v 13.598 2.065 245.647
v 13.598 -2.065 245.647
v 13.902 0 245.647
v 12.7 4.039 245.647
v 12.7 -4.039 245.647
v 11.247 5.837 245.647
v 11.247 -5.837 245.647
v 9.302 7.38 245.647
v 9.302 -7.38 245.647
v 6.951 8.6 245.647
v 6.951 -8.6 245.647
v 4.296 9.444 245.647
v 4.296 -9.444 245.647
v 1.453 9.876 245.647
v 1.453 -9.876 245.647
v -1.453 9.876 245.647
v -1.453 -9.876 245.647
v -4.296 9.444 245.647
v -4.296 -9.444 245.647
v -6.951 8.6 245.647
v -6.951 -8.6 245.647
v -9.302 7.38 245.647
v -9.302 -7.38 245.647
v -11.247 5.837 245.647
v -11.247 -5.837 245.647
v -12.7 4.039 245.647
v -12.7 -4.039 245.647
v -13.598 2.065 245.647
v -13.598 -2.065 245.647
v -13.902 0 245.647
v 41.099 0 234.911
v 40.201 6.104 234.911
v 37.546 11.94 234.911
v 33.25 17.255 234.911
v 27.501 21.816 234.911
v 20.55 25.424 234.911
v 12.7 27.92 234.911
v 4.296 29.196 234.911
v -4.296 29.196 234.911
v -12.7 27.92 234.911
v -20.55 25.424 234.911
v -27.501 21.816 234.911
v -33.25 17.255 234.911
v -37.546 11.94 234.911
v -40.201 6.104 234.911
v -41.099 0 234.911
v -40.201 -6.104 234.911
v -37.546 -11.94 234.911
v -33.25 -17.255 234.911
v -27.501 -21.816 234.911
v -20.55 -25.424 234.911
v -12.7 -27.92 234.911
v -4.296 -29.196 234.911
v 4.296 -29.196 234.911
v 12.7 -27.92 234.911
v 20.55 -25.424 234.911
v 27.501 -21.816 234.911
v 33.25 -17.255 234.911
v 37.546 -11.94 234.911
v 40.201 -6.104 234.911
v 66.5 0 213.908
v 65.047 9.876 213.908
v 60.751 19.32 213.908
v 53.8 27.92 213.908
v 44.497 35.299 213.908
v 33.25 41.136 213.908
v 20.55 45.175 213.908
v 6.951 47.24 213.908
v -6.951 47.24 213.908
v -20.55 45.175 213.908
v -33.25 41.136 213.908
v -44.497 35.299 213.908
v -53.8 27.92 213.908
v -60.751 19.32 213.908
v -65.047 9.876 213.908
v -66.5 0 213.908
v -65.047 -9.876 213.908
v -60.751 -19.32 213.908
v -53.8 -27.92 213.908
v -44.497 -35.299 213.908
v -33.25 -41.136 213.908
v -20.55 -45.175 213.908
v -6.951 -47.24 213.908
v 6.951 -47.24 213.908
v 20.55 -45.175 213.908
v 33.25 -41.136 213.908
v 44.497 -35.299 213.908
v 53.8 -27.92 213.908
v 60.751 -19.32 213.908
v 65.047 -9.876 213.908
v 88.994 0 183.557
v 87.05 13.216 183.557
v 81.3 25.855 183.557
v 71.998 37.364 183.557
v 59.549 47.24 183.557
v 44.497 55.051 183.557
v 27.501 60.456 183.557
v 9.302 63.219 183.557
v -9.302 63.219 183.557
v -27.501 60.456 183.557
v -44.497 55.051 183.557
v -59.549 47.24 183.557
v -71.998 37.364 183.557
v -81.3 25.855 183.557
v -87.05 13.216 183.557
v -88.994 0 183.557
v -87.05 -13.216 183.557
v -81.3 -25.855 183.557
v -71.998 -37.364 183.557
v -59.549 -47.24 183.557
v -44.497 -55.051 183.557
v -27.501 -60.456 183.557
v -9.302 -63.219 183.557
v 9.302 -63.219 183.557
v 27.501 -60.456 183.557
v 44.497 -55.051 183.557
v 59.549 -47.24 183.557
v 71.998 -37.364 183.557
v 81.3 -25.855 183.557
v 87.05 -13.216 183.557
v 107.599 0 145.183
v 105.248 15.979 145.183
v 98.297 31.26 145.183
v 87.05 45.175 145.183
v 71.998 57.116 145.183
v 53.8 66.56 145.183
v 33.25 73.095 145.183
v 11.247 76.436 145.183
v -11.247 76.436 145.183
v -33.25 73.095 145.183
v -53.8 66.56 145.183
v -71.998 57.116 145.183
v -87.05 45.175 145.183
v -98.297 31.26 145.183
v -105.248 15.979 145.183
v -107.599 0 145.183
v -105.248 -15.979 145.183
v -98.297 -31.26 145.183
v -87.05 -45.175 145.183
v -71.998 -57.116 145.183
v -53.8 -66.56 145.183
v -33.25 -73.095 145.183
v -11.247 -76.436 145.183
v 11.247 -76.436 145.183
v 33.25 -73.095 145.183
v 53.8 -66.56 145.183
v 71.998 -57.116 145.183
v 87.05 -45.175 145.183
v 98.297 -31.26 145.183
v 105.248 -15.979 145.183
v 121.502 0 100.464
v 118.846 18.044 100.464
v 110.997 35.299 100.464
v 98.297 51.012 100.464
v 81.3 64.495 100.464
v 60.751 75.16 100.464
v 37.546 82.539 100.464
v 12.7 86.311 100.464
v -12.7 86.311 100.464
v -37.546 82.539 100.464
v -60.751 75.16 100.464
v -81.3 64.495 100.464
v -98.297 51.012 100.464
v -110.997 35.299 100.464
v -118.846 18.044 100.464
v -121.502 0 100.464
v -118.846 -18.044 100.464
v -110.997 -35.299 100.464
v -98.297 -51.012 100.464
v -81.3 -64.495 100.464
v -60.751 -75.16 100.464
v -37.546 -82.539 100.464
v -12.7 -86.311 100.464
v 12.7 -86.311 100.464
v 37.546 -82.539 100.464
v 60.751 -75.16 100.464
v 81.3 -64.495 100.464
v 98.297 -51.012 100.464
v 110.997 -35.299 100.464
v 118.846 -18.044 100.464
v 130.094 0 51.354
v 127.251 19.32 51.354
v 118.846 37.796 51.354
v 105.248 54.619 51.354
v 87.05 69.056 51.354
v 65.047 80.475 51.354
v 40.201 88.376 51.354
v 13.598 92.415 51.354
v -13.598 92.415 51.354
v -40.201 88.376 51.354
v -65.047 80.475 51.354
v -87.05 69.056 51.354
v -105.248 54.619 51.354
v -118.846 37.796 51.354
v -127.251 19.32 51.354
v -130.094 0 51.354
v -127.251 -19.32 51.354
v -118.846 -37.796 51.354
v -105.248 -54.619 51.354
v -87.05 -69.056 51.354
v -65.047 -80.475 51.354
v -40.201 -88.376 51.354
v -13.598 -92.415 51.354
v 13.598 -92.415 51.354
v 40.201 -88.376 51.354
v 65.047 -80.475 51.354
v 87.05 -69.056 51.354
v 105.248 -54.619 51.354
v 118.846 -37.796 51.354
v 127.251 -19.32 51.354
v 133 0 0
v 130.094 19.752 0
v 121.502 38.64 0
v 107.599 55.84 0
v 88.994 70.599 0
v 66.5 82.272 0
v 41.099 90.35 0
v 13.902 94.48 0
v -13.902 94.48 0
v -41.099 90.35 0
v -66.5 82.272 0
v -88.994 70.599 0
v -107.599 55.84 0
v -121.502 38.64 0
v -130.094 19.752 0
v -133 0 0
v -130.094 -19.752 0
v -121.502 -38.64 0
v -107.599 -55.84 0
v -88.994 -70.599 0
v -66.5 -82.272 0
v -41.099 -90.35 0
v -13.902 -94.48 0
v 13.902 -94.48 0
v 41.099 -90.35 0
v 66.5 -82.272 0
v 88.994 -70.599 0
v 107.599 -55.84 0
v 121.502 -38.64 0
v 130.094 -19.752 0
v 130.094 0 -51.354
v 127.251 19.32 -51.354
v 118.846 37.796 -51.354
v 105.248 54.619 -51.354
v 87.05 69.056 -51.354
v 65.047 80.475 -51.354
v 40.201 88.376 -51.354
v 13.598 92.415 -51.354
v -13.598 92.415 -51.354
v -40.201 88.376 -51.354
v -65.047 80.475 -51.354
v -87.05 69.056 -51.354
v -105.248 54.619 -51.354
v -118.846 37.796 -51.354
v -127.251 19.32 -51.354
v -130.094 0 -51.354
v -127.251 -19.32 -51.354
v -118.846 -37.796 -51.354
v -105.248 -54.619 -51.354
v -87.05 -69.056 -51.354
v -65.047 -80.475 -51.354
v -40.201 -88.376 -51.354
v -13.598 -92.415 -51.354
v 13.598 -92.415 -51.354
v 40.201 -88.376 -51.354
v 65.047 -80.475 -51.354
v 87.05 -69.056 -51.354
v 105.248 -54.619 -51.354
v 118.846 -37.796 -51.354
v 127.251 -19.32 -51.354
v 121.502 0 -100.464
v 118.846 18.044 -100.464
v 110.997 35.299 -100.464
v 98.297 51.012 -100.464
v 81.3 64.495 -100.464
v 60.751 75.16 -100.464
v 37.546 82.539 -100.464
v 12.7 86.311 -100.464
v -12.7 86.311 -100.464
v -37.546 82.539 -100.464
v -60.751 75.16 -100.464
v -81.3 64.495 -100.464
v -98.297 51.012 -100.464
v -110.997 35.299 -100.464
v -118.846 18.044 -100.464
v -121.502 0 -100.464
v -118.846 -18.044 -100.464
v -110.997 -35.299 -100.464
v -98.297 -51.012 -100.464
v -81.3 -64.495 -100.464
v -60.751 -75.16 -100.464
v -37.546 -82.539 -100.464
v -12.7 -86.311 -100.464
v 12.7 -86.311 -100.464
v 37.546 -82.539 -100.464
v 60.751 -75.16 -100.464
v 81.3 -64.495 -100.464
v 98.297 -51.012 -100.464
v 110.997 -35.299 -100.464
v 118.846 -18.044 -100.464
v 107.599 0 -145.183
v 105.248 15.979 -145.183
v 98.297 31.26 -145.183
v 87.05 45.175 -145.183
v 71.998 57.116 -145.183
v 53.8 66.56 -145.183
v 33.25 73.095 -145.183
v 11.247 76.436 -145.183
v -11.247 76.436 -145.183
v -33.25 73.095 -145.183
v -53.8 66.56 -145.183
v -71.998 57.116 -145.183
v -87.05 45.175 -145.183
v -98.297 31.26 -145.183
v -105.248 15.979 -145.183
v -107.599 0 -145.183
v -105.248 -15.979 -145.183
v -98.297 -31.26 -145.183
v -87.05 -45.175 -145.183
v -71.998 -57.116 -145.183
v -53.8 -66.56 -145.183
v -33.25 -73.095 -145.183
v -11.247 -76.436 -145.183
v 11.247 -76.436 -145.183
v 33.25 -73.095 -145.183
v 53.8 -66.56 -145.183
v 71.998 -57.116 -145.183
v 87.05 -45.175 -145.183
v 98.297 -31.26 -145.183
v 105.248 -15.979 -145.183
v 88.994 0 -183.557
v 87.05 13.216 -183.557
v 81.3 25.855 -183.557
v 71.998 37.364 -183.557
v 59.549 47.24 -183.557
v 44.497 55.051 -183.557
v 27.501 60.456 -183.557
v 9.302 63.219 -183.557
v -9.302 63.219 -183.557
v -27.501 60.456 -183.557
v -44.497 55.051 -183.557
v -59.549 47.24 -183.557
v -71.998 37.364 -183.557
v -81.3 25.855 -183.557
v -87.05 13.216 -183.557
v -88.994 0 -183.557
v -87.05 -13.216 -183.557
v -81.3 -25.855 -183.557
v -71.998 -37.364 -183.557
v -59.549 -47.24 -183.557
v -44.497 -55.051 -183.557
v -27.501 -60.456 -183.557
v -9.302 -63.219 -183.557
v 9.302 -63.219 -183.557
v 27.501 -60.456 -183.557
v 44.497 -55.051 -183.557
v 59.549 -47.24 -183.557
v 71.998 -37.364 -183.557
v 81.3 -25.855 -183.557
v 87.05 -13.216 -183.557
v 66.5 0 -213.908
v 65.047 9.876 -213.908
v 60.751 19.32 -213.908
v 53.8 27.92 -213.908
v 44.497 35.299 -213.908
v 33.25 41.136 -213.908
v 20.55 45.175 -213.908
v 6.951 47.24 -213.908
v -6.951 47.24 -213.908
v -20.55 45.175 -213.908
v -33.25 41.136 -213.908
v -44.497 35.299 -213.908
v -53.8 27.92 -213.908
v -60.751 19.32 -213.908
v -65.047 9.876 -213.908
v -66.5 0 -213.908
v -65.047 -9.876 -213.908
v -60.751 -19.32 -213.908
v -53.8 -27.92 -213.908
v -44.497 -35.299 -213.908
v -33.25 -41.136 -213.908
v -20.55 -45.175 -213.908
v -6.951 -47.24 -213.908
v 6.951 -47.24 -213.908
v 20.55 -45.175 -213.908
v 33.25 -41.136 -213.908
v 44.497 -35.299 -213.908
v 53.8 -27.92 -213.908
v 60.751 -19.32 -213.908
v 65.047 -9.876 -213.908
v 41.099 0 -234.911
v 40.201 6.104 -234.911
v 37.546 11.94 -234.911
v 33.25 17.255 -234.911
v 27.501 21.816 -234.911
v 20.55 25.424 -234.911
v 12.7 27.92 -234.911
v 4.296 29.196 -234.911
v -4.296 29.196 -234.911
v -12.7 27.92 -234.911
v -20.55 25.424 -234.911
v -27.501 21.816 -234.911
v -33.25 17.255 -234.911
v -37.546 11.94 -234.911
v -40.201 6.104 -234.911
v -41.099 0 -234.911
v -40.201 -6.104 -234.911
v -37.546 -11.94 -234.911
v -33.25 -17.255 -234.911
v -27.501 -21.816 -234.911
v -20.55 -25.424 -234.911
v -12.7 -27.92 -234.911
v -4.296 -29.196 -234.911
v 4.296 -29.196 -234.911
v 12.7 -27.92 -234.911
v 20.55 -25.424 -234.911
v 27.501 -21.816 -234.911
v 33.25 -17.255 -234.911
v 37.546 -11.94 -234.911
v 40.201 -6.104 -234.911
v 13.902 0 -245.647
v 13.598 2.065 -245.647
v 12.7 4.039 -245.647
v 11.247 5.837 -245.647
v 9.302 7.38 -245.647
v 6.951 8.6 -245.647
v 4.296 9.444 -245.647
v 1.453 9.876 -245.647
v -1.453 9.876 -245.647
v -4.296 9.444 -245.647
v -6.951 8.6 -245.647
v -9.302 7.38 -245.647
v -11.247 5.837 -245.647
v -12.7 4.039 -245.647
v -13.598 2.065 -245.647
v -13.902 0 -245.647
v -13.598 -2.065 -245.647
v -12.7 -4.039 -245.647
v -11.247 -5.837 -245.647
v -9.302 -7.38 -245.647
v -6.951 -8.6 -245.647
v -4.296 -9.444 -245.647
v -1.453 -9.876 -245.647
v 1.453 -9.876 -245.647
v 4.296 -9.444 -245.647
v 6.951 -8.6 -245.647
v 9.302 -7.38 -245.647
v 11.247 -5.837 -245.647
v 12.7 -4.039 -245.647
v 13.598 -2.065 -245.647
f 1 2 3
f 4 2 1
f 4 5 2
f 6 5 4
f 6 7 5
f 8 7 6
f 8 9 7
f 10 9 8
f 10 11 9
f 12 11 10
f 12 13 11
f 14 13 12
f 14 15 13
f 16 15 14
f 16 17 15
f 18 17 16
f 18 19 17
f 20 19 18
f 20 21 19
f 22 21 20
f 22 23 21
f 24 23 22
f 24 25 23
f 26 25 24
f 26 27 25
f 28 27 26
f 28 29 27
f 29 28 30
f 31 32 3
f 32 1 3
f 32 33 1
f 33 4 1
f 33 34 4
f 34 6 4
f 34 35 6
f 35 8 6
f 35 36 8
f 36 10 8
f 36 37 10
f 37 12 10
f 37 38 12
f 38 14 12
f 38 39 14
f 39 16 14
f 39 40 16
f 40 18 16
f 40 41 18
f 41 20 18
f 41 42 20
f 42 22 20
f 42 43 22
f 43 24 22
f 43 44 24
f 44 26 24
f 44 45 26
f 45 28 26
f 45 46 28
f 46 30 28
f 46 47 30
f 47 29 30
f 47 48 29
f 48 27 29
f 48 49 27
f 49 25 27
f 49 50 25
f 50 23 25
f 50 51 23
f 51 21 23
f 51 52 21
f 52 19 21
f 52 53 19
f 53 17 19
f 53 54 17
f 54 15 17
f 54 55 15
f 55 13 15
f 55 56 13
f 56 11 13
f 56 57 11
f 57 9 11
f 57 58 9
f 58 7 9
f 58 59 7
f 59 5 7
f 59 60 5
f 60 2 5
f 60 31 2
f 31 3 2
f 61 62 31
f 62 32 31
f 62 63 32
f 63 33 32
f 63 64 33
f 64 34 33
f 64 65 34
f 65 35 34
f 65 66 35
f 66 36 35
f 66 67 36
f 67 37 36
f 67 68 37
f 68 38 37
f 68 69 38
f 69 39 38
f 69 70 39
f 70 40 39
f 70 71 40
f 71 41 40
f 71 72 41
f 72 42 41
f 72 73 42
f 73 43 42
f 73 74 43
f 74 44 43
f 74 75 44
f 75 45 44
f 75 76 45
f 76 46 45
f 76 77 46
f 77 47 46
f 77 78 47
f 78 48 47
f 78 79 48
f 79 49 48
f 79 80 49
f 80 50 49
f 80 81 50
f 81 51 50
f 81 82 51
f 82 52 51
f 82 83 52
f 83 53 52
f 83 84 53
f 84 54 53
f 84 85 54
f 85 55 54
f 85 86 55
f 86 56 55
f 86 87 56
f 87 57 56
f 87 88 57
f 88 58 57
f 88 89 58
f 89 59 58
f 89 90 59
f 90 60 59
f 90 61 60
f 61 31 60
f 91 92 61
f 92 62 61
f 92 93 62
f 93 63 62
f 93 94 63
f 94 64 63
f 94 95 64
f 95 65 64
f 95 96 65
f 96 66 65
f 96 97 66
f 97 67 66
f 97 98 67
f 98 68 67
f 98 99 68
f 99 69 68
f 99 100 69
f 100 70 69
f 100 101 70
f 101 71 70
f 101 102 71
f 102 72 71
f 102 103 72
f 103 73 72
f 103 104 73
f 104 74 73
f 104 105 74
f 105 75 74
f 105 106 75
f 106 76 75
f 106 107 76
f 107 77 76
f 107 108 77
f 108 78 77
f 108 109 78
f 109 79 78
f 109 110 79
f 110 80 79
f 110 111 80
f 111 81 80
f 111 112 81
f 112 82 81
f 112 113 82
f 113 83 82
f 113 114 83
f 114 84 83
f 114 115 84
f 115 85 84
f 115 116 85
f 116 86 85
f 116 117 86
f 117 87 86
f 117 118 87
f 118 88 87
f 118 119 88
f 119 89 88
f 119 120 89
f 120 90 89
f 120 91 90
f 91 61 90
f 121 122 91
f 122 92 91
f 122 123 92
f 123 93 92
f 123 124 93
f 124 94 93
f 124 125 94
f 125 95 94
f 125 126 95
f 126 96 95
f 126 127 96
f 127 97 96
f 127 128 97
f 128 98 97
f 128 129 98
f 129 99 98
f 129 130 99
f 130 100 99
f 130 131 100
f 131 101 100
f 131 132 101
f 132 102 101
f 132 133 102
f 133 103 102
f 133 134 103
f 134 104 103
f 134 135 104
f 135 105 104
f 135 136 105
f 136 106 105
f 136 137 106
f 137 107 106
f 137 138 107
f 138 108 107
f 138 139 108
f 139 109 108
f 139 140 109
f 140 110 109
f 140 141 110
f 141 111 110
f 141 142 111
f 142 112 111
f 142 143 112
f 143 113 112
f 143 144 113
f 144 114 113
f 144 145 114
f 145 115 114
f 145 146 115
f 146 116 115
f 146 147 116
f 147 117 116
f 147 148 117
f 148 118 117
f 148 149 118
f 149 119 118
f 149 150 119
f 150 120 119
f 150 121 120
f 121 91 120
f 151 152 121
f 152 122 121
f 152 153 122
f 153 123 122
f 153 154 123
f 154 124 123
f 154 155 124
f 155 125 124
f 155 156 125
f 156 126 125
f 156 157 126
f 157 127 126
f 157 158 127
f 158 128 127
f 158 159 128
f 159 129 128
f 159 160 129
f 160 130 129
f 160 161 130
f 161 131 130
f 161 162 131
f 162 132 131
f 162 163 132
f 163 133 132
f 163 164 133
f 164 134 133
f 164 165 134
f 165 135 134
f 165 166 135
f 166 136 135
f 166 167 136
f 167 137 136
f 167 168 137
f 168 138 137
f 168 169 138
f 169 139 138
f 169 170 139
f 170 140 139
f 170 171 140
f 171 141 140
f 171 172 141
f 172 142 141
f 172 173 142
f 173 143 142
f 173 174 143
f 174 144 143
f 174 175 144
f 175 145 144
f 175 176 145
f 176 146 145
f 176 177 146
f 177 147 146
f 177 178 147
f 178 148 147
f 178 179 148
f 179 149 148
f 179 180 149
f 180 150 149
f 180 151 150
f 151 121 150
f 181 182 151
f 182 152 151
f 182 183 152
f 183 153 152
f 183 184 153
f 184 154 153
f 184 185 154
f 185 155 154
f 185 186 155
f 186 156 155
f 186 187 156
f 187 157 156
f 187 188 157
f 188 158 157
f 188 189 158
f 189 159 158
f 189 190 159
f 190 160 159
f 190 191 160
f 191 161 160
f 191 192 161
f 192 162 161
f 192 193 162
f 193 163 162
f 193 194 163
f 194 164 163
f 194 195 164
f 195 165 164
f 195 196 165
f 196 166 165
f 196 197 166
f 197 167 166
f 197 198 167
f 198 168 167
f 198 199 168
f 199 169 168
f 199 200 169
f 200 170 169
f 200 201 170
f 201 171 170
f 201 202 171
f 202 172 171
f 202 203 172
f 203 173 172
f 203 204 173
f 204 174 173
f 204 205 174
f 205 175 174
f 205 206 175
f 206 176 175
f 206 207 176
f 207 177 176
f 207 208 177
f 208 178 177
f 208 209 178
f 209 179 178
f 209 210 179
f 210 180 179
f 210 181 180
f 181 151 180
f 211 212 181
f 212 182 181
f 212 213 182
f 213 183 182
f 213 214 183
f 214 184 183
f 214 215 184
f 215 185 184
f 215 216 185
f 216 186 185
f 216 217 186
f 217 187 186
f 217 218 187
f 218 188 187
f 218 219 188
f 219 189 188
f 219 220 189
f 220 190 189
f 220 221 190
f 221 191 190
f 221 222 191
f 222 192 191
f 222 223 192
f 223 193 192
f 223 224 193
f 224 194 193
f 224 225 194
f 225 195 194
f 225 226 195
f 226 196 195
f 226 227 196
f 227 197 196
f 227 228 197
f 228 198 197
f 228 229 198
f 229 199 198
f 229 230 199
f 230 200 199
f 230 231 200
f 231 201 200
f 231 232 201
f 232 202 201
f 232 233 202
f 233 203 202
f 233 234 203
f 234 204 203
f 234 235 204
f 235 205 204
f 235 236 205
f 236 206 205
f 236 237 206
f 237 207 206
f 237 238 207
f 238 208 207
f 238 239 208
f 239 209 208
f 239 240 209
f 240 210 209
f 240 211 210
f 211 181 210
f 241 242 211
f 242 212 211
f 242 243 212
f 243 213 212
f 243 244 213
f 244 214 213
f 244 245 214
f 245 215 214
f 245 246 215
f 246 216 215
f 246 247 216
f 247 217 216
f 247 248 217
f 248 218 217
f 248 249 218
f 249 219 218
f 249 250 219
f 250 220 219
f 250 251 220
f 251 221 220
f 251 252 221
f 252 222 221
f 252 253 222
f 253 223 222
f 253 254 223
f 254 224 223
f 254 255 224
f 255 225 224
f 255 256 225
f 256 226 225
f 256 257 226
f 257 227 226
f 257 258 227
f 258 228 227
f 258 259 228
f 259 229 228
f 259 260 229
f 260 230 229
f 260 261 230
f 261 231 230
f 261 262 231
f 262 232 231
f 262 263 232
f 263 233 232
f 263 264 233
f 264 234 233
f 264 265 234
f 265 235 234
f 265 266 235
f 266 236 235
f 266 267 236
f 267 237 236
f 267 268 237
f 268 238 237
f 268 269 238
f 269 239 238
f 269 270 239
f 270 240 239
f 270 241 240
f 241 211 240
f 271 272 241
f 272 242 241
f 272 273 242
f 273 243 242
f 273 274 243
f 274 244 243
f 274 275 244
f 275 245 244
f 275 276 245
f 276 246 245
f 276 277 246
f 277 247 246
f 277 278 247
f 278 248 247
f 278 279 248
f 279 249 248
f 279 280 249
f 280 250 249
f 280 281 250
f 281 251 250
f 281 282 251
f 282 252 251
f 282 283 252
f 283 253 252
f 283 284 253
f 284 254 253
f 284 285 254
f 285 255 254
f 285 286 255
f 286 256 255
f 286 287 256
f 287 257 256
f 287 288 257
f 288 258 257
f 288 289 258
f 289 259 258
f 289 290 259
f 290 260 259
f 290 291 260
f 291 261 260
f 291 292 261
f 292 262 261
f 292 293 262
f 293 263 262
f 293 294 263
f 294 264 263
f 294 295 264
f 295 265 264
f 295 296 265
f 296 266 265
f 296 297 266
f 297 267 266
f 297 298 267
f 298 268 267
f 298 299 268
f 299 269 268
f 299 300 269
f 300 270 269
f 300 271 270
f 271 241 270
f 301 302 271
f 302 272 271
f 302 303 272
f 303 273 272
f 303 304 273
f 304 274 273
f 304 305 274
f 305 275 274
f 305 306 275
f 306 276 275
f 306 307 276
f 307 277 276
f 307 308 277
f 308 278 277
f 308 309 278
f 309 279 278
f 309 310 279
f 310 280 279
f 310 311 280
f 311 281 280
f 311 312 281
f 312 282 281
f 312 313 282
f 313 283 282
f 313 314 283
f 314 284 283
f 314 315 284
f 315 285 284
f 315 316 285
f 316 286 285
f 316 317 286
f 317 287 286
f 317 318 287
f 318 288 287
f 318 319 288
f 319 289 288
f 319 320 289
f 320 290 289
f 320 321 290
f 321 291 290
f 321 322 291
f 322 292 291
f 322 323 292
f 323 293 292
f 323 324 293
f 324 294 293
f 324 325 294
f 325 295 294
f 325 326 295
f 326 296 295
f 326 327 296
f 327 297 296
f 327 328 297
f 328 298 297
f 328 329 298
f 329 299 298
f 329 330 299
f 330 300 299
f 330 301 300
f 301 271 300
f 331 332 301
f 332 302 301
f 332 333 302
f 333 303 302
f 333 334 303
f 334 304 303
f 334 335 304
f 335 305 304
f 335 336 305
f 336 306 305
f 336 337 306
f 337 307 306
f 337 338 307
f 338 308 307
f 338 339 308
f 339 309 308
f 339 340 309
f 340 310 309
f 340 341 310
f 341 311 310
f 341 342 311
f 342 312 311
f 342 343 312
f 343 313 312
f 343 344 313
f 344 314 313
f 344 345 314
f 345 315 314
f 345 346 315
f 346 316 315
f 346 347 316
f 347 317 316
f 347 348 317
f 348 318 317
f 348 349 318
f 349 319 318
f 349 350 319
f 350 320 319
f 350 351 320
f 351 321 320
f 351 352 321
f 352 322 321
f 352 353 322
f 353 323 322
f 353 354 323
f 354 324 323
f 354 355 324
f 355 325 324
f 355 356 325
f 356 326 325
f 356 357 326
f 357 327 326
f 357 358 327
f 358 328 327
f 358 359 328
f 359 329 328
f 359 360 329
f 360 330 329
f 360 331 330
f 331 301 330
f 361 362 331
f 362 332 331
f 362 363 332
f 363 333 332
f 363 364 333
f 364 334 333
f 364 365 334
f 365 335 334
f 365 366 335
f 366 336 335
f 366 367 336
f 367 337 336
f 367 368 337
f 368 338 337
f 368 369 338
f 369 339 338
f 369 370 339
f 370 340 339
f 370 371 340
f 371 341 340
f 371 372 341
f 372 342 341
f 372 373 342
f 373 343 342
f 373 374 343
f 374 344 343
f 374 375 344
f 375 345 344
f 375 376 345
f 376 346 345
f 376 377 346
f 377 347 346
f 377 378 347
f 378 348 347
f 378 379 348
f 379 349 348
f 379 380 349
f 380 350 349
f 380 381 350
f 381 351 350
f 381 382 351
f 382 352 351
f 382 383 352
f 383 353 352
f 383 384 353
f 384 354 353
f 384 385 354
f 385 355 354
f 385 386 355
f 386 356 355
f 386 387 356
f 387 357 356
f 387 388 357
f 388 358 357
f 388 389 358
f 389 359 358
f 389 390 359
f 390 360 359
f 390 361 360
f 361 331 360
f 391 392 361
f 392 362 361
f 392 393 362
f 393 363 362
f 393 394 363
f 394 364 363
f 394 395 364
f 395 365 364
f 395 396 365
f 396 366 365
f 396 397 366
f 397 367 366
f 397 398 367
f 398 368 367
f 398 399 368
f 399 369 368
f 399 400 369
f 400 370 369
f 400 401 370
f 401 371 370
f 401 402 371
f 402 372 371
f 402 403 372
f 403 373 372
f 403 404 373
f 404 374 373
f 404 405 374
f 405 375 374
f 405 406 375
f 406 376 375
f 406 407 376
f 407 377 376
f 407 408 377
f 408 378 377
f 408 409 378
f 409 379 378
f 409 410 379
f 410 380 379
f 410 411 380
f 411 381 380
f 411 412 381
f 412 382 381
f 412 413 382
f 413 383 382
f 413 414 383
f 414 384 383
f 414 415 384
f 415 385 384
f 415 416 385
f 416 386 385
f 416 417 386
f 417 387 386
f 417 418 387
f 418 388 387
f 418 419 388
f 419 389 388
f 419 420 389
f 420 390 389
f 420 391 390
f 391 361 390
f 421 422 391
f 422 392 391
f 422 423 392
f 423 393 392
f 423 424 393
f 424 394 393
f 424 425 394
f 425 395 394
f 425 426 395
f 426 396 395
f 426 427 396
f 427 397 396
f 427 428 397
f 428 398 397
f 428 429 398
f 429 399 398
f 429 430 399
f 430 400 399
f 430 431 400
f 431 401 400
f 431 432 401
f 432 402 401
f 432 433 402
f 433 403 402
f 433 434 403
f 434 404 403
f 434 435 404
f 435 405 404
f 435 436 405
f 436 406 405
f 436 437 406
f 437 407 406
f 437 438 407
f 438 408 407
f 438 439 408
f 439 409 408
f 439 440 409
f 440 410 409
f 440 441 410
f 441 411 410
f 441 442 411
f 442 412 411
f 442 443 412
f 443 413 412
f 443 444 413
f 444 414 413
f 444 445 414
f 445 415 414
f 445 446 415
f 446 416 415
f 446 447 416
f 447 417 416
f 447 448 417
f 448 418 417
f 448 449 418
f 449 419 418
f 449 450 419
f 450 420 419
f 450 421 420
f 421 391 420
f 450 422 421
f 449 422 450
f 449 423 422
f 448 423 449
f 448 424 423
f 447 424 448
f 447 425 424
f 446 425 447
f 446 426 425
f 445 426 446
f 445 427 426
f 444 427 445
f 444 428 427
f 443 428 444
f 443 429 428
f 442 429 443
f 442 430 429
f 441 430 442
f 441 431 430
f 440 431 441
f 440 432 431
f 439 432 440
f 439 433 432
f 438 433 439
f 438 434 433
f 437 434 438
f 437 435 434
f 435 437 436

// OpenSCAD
// Generated by SolidPython 1.0.1 on 2020-07-29 00:46:47


scale(v = [7, 5, 13]) {
	sphere(r = 19);
}
/***********************************************
*********      SolidPython code:      **********
************************************************
 
# import packages: SolidPython
from solid import *
from solid.utils import *
from itertools import chain, combinations, permutations


class Resize:

    def __init__(self, scad_file):
        self.scad_file = scad_file
        #self.scad_file = import_scad(scad_file)
        # cone/cylinder param:
        self.r1 = 0
        self.r2 = 0
        self.h = 0
        # rectangular prism param:
        self.w = 0
        self.l = 0
        # ellipse param:
        self.r = 0

    # import OpenScad code (file name corresponds to shape)


    # classify shape + parameters
    def assign(self, param1, param2, param3):
        if self.scad_file == 'cone.scad':
            self.r1 = param1
            self.r2 = param2
            self.h = param3
        elif self.scad_file == 'cylinder.scad':
            self.r1 = param1
            self.r2 = param2
            self.h = param3
        elif self.scad_file == 'rectangularPrism.scad':
            self.h = param1
            self.l = param2
            self.w = param3
        else:
            self.r = param1
            self.h = param2

    # resize parameters
    def iterate(self):
        x = range(3, 20, 2)
        i = 1
        if self.scad_file == 'cone.scad':
            tempList = list(permutations(x, 2))
            for temp in tempList:
                param1 = temp[0]
                param2 = temp[1]
                filepath = 'produced_scad_files/' + 'cone' + str(param1) + '_' + str(param2) + '_' + '.scad'
                scad_render_to_file(cylinder(h=param1, r1=param2, r2=0), filepath)

        elif self.scad_file == 'cylinder.scad':
            tempList = list(permutations(x, 3))
            for temp in tempList:
                param1 = temp[0]
                param2 = temp[1]
                filepath = 'produced_scad_files/' + 'cylinder' + str(param1) + '_' + str(param2) + '_' + '.scad'
                scad_render_to_file(cylinder(h=param1, r1=param2, r2=param2), filepath)

        elif self.scad_file == 'rectangularPrism.scad':
            tempList = list(permutations(x, 3))
            for temp in tempList:
                param1 = temp[0]
                param2 = temp[1]
                param3 = temp[2]
                filepath = 'produced_scad_files/' + 'rectangularPrism' + str(param1) + '_' + str(param2) + '_' + str(
                    param3) + '.scad'
                scad_render_to_file(cube(size=(param1, param2, param3)), filepath)

        elif self.scad_file == 'ellipse.scad':
            tempList = list(permutations(x, 4))
            for temp in tempList:
                param1 = temp[0]
                param2 = temp[1]
                param3 = temp[2]
                param4 = temp[3]
                filepath = 'produced_scad_files/' + 'ellipse' + str(param1) + '_' + str(param2) + '_' + str(param3) + '_' + str(param4) + '.scad'
                scad_render_to_file(scale([param1, param2, param3])(sphere(r=param4)), filepath)

    def render_to_scadfile(self):
        scad_render_to_file(scad, 'example.scad') 
 
************************************************/
